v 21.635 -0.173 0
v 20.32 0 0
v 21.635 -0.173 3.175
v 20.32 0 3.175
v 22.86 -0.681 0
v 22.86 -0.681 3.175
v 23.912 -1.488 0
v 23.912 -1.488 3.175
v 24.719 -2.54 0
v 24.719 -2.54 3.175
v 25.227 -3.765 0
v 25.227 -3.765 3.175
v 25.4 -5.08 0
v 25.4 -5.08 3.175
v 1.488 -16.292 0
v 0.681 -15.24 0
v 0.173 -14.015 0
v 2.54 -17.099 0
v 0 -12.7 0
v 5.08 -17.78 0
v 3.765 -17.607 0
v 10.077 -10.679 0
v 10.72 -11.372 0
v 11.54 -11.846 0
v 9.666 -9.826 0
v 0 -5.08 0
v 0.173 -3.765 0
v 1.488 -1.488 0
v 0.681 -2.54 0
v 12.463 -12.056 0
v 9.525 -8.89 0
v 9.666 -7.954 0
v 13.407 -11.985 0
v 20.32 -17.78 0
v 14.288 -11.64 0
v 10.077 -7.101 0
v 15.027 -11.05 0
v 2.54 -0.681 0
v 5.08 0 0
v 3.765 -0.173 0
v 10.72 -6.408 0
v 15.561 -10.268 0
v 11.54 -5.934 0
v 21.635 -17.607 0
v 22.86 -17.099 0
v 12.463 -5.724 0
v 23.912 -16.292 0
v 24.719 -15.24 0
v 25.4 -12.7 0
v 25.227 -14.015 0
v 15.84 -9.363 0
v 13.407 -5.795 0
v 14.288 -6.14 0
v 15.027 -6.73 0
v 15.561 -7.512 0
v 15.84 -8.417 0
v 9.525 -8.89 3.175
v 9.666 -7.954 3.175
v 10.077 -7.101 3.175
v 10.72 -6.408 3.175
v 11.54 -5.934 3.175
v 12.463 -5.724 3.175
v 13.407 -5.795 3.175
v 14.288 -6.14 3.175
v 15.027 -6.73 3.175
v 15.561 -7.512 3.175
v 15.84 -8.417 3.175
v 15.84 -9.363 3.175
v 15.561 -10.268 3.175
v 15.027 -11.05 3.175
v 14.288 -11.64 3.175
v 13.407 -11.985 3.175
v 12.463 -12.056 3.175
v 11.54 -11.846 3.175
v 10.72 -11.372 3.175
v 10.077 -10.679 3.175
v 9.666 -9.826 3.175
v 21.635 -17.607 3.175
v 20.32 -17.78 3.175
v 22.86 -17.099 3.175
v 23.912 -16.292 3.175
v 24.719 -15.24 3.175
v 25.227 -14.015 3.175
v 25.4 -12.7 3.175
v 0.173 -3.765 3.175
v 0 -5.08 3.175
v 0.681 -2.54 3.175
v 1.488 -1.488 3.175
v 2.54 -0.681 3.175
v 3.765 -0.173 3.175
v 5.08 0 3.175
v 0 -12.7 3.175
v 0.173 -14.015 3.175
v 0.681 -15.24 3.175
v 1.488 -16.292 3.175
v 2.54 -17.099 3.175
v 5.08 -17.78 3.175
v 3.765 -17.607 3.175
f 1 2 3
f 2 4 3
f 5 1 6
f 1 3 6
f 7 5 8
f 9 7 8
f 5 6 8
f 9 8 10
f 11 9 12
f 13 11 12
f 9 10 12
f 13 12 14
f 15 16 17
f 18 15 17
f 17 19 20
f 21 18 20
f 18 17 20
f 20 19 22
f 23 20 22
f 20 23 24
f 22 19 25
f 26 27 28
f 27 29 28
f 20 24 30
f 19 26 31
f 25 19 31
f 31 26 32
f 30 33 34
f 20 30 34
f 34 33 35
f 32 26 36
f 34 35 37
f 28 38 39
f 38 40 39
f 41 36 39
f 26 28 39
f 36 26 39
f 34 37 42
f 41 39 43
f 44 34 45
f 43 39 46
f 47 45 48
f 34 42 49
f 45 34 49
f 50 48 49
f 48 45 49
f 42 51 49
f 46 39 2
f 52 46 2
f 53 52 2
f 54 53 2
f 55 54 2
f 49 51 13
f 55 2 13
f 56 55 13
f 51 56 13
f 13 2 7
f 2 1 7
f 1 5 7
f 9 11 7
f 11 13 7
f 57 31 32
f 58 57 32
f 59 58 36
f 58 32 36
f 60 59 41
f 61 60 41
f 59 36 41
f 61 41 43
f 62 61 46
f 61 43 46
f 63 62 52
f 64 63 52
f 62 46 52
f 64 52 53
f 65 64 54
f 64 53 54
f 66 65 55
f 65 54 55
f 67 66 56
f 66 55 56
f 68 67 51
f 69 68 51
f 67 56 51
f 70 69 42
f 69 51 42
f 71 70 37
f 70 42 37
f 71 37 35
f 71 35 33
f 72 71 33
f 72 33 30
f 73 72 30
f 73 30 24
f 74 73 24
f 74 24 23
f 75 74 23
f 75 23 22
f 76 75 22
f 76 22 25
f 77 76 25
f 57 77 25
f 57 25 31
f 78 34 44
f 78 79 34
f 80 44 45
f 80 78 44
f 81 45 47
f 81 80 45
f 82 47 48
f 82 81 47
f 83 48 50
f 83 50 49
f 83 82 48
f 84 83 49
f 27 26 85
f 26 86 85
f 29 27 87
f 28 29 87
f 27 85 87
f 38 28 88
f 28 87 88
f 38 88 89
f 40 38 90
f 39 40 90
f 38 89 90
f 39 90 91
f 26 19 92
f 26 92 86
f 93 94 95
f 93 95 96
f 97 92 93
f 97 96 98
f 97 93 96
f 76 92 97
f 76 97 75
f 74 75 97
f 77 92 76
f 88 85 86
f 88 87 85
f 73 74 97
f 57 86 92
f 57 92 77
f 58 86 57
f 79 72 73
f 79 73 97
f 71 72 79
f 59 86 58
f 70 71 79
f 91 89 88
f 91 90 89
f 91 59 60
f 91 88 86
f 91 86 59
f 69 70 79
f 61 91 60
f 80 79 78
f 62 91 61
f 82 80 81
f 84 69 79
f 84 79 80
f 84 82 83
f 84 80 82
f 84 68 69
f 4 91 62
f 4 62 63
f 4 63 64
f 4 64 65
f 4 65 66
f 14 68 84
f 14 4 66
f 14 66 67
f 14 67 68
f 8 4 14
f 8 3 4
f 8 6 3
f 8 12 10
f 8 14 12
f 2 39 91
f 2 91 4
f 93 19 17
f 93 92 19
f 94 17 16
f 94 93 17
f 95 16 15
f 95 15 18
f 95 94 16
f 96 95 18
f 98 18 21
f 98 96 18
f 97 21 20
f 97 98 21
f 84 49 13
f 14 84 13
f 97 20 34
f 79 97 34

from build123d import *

# Parameters (mm, degrees)
SKETCH1_W           = 25.4
SKETCH1_H           = 17.78
BOSS_EXTRUDE1_DEPTH = 3.175
HOLE1_D             = 6.35
FILLET1_R           = 5.08


with BuildPart() as part:
    # Sketch1 → Boss-Extrude1 (new body)
    with BuildSketch(Plane.XY):
        with Locations((12.7, -8.89)):
            Rectangle(SKETCH1_W, SKETCH1_H)
    extrude(amount=BOSS_EXTRUDE1_DEPTH)

    # Hole1 (through all)
    with Locations(Plane.XY.offset(3.175)):
        with Locations((12.7, -8.89)):
            Hole(HOLE1_D / 2)

    # Fillet1
    fillet1_edges = [part.edges().sort_by_distance(p)[0] for p in [
        (0, 0, 1.5875),
        (25.4, 0, 1.5875),
        (25.4, -17.78, 1.5875),
        (0, -17.78, 1.5875),
    ]]
    fillet(fillet1_edges, radius=FILLET1_R)


solid = part.part
